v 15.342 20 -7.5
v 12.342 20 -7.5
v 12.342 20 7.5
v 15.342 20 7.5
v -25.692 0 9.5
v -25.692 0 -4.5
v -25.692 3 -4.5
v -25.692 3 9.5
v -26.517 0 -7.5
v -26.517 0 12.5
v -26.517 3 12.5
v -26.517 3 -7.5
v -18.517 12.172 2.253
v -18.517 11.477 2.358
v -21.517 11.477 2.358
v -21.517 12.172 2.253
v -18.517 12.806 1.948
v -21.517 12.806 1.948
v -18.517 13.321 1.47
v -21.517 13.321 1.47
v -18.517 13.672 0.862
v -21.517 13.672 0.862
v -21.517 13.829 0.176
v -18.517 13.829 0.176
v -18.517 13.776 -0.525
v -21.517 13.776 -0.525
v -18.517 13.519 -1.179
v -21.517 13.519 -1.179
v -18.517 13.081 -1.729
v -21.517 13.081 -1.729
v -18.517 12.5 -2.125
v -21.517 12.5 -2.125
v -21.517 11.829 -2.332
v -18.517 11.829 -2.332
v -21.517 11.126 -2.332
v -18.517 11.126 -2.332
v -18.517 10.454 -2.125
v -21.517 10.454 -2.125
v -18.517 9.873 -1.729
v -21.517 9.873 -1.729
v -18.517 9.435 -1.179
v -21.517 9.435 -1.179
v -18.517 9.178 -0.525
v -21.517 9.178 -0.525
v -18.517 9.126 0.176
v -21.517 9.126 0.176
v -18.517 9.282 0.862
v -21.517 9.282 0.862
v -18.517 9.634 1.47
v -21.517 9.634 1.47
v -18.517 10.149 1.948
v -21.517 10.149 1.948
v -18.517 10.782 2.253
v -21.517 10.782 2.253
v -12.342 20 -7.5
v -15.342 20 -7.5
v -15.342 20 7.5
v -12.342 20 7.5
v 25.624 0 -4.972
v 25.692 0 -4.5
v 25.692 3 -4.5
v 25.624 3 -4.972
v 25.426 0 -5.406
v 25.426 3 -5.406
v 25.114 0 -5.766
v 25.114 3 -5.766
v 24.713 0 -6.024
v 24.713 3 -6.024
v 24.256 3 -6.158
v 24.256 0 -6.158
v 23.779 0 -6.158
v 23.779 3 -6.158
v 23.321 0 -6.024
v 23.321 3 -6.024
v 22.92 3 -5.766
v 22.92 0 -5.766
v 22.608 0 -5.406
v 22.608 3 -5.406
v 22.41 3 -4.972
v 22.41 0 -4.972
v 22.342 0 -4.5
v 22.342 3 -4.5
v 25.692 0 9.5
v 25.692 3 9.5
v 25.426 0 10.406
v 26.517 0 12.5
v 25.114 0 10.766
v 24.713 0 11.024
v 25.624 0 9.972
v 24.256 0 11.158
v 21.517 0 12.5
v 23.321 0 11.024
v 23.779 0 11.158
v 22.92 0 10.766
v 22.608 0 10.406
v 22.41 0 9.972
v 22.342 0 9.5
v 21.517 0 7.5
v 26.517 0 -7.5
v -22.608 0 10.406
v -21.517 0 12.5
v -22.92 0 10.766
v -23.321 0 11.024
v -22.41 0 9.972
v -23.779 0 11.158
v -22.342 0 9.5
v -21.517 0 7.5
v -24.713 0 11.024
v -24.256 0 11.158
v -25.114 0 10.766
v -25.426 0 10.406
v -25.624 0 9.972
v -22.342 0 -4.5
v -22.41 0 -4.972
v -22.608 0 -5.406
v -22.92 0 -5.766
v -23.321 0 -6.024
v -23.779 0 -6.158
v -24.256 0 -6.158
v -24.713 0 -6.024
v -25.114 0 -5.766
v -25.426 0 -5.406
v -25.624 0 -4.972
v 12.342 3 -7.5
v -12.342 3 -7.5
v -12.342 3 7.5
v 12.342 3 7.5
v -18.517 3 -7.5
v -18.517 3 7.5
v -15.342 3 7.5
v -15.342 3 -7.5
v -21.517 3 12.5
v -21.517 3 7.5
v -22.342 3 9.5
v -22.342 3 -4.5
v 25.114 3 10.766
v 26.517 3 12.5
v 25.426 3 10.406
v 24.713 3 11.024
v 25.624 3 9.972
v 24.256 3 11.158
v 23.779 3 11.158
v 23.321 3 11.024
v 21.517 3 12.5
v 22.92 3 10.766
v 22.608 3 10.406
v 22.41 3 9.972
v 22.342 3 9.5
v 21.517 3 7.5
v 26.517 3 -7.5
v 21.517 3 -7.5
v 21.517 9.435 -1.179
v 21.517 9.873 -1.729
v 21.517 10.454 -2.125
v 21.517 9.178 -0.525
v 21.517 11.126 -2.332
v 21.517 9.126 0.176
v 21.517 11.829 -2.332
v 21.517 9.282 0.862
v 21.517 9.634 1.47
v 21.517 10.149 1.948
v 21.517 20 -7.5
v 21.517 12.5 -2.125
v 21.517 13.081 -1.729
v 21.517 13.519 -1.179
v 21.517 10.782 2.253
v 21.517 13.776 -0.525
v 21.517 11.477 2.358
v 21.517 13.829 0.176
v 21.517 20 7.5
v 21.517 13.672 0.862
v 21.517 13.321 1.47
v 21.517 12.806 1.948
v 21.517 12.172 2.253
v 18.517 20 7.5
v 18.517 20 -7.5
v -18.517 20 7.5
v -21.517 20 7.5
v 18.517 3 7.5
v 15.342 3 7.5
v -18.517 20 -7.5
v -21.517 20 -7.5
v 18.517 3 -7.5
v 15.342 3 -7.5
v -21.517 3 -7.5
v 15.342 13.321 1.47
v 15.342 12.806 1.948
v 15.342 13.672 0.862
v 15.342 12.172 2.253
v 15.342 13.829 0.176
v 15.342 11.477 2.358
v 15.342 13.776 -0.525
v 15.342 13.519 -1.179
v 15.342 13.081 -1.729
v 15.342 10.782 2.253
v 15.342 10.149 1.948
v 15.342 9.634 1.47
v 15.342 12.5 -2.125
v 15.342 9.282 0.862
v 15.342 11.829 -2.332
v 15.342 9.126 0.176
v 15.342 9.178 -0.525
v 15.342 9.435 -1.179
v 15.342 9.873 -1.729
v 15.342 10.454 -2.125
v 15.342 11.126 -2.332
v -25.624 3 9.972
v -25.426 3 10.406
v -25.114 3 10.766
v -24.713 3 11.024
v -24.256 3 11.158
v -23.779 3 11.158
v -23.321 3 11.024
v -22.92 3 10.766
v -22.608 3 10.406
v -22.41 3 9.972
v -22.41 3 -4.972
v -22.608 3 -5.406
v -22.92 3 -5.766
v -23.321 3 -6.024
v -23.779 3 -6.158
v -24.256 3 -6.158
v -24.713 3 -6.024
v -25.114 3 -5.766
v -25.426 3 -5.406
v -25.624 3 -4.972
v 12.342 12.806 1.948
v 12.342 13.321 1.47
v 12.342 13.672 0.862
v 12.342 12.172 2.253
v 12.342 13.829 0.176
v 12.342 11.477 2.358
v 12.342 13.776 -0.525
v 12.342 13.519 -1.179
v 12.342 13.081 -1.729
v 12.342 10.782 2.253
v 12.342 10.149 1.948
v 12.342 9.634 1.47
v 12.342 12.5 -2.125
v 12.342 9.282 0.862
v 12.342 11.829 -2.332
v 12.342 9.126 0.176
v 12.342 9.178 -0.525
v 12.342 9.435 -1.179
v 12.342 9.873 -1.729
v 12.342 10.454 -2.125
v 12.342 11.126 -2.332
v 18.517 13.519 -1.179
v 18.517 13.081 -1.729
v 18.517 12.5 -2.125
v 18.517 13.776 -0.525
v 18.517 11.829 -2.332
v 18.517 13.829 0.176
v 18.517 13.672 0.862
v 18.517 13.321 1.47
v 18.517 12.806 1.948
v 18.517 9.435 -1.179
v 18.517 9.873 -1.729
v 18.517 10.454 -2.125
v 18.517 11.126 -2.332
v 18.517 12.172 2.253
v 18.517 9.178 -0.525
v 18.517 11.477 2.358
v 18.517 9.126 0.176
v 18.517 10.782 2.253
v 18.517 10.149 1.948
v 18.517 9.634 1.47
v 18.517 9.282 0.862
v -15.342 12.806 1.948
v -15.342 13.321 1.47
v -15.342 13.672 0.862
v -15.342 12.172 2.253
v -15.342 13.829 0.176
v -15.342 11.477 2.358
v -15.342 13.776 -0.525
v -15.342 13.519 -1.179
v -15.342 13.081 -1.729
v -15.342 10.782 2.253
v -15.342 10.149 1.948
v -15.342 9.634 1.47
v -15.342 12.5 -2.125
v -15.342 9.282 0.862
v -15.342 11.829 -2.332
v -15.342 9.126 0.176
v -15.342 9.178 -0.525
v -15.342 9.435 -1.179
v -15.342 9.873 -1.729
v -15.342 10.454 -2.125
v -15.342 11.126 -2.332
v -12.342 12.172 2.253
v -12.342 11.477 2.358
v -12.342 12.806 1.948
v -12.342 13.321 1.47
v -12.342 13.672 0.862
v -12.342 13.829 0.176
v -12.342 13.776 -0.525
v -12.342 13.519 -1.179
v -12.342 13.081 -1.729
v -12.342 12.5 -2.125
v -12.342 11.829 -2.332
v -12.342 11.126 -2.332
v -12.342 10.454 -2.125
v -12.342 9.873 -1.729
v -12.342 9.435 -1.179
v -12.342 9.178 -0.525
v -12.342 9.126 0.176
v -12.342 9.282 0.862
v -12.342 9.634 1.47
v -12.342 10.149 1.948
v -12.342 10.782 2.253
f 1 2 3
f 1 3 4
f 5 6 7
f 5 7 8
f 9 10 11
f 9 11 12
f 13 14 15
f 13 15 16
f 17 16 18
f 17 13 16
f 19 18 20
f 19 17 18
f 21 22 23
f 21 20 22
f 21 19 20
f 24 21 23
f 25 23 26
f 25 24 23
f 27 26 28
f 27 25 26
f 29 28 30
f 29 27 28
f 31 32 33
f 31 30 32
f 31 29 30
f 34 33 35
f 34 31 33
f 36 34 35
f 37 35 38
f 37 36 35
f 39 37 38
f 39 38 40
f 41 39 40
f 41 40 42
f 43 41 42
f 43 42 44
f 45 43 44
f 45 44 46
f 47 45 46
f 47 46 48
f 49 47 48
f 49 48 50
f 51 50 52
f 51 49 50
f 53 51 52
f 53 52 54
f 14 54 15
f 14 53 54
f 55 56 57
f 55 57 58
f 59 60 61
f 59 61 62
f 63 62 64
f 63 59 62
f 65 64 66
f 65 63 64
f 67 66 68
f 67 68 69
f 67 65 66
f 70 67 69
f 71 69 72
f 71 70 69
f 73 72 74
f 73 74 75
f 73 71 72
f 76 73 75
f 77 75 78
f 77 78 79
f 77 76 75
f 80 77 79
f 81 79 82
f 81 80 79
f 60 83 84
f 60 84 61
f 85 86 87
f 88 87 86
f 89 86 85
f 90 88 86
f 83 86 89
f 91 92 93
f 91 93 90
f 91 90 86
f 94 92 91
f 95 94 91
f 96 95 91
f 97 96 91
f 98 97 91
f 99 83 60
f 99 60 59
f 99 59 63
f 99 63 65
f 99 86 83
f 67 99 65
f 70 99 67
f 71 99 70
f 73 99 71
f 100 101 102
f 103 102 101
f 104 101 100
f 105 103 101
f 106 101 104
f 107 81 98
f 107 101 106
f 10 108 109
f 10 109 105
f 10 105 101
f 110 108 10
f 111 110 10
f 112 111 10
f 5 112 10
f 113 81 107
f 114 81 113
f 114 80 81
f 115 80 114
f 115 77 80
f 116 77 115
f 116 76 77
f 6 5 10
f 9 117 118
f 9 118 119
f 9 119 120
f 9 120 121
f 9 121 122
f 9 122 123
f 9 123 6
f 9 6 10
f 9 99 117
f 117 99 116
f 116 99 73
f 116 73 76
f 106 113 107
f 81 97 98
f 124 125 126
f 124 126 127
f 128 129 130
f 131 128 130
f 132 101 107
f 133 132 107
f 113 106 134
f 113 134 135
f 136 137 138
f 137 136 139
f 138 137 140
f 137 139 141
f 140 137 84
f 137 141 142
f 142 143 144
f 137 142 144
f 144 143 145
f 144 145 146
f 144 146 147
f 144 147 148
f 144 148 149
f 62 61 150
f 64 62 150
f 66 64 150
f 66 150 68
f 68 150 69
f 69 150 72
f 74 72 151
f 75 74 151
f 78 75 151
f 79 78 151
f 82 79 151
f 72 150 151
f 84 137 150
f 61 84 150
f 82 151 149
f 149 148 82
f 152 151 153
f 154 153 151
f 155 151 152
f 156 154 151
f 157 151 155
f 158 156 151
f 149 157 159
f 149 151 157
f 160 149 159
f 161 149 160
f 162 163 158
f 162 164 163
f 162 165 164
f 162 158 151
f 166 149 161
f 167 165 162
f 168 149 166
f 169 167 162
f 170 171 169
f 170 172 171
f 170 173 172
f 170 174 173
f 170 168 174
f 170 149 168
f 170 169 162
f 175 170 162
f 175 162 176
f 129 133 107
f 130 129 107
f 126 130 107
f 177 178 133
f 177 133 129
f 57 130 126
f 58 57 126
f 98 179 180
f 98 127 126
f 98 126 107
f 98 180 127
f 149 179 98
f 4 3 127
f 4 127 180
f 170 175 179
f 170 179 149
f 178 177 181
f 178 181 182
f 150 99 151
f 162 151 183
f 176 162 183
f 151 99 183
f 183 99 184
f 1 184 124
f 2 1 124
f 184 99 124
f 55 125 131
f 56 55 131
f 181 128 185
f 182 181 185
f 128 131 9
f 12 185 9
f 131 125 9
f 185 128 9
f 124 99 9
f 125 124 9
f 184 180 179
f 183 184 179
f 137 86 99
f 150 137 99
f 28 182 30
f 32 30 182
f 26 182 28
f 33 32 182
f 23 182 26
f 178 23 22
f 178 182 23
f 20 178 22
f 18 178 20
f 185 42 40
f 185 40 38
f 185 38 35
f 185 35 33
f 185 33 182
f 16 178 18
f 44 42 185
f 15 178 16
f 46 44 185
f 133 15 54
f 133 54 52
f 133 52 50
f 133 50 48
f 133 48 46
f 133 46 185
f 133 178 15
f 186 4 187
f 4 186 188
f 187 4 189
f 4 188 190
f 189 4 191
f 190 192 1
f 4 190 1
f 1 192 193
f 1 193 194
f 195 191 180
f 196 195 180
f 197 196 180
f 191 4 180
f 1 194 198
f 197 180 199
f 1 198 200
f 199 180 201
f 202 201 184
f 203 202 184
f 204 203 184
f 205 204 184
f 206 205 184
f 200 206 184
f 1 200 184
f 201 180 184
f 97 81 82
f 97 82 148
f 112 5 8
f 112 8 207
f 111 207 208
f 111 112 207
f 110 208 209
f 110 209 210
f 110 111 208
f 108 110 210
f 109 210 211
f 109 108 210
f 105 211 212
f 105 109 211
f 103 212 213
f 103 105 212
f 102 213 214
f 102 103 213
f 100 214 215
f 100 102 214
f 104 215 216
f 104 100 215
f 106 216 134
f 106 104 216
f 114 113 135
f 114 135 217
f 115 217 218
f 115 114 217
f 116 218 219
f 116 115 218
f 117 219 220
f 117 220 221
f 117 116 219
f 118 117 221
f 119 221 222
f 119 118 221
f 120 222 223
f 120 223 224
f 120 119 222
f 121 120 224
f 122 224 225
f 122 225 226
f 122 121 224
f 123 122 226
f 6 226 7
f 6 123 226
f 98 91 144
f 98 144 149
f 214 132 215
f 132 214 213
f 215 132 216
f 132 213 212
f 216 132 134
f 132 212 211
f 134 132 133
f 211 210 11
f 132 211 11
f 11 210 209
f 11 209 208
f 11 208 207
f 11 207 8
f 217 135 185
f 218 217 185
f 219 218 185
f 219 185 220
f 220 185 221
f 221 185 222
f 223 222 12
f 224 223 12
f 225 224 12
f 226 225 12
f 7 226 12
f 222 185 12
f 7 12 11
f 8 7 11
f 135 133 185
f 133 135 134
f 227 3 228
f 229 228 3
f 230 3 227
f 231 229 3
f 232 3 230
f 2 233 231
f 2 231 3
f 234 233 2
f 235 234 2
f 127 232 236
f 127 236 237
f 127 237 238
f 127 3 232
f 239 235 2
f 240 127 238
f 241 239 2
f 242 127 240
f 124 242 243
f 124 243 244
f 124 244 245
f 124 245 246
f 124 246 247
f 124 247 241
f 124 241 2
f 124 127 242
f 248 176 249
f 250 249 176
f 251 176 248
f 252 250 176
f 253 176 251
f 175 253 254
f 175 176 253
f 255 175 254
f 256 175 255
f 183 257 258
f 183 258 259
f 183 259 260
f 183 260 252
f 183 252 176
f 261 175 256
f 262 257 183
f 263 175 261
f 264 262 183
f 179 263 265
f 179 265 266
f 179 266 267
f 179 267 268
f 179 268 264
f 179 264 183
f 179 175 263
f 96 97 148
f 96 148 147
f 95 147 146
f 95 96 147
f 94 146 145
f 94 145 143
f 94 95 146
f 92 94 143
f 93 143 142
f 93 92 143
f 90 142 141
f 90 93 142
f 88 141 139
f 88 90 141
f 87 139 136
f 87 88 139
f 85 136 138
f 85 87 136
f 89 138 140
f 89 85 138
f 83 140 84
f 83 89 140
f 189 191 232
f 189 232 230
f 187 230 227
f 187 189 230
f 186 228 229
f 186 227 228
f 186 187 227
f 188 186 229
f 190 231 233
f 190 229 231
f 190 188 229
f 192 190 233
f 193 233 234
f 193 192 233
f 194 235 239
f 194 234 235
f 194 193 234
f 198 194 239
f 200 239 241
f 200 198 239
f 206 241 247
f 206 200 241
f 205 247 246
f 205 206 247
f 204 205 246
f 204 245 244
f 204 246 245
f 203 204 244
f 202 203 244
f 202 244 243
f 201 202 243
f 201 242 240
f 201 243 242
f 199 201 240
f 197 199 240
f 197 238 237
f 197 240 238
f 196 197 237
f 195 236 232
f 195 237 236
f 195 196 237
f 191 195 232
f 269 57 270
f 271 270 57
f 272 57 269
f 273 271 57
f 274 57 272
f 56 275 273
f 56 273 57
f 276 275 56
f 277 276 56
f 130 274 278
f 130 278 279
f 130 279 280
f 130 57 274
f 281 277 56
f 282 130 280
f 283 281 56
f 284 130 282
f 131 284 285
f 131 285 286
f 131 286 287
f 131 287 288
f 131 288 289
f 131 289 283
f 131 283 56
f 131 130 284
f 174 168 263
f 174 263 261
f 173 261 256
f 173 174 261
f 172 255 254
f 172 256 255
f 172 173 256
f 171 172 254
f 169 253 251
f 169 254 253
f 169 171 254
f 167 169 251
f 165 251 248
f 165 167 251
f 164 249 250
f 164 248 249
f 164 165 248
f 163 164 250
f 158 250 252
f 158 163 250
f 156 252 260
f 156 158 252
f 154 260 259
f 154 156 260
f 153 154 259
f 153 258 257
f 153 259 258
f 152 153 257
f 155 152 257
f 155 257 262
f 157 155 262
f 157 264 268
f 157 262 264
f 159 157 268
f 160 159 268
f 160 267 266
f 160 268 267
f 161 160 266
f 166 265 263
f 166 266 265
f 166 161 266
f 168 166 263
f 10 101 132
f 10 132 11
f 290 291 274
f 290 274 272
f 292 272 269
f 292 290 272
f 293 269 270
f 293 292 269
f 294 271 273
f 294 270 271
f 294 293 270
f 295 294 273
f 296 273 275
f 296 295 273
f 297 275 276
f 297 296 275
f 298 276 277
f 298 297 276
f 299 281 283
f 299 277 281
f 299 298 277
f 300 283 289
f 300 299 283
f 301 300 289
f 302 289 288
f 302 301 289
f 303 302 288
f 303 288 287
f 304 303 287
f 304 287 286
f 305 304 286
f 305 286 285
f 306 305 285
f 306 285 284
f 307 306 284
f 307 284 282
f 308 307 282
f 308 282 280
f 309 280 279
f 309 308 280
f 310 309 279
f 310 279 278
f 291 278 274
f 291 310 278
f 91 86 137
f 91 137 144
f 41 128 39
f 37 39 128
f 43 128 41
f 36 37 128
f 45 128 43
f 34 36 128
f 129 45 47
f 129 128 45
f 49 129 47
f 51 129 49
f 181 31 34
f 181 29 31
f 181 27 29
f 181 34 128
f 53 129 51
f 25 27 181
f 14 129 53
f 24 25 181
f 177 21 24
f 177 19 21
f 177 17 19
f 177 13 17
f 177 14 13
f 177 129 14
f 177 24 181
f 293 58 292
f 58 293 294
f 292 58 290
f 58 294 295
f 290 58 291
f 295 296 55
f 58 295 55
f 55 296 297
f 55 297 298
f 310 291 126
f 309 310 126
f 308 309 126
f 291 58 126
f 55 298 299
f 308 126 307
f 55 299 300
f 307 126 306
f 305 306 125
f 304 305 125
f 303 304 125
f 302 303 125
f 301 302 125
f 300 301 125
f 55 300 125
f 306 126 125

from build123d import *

# Parameters (mm, degrees)
SKETCH1_W               = 30.6846
SKETCH1_H               = 15
BOSS_EXTRUDE1_DEPTH     = 3
SKETCH2_W               = 3
SKETCH2_H               = 15
BOSS_EXTRUDE2_DEPTH     = 17
SKETCH4_W               = 3.175
SKETCH4_H               = 3
BOSS_EXTRUDE3_DEPTH     = 15
CUT_EXTRUDE1_DEPTH      = 43.601409744
CUT_EXTRUDE1_DEPTH_BACK = 43.601409744
SKETCH3_R               = 2.358188849
SKETCH5_W               = 5
SKETCH5_H               = 20
BOSS_EXTRUDE4_DEPTH     = 3


with BuildPart() as part:
    # Sketch1 → Boss-Extrude1 (new body)
    with BuildSketch(Plane(origin=(0, 0, 0), x_dir=(1, 0, 0), z_dir=(0, 1, 0))):
        Rectangle(SKETCH1_W, SKETCH1_H)
    extrude(amount=BOSS_EXTRUDE1_DEPTH)

    # Sketch2 → Boss-Extrude2 (add)
    with BuildSketch(Plane(origin=(0, 3, 0), x_dir=(1, 0, 0), z_dir=(0, 1, 0))):
        with Locations((-13.8423, 0)):
            Rectangle(SKETCH2_W, SKETCH2_H)
        with Locations((13.8423, 0)):
            Rectangle(SKETCH2_W, SKETCH2_H)
    extrude(amount=BOSS_EXTRUDE2_DEPTH)

    # Sketch4 → Boss-Extrude3 (add)
    with BuildSketch(Plane.XY.offset(7.5)):
        Polygon((-18.5173, 0), (-18.5173, 3), (-18.5173, 20), (-21.5173, 20), (-21.5173, 0), align=None)
        with Locations((-16.9298, 1.5)):
            Rectangle(SKETCH4_W, SKETCH4_H)
        with Locations((16.9298, 1.5)):
            Rectangle(SKETCH4_W, SKETCH4_H)
        Polygon((18.5173, 20), (18.5173, 3), (18.5173, 0), (21.5173, 0), (21.5173, 20), align=None)
    extrude(amount=-BOSS_EXTRUDE3_DEPTH)

    # Sketch3 → Cut-Extrude1 (cut, two sides: drawn at the far end of the back side and taken through both)
    with BuildSketch(Plane.ZY.offset(15.3423).offset(-CUT_EXTRUDE1_DEPTH_BACK)):
        with Locations((0, 11.477245264)):
            Circle(SKETCH3_R)
    extrude(amount=CUT_EXTRUDE1_DEPTH + CUT_EXTRUDE1_DEPTH_BACK, mode=Mode.SUBTRACT)

    # Sketch5 → Boss-Extrude4 (add)
    # profile 1 of 2: a face of its own
    with BuildSketch(Plane(origin=(0, 0, 0), x_dir=(-1, 0, 0), z_dir=(0, -1, 0))):
        with Locations((24.0173, -2.5)):
            Rectangle(SKETCH5_W, SKETCH5_H)
        with BuildLine():
            Line((25.6923, 4.5), (25.6923, -9.5))
            ThreePointArc((25.6923, -9.5), (24.0173, -11.175), (22.3423, -9.5))
            Line((22.3423, -9.5), (22.3423, 4.5))
            ThreePointArc((22.3423, 4.5), (24.0173, 6.175), (25.6923, 4.5))
        make_face(mode=Mode.SUBTRACT)
    # profile 2 of 2: a face of its own
    with BuildSketch(Plane(origin=(0, 0, 0), x_dir=(-1, 0, 0), z_dir=(0, -1, 0))):
        with Locations((-24.0173, -2.5)):
            Rectangle(SKETCH5_W, SKETCH5_H)
        with BuildLine():
            Line((-22.3423, 4.5), (-22.3423, -9.5))
            ThreePointArc((-22.3423, -9.5), (-24.0173, -11.175), (-25.6923, -9.5))
            Line((-25.6923, -9.5), (-25.6923, 4.5))
            ThreePointArc((-25.6923, 4.5), (-24.0173, 6.175), (-22.3423, 4.5))
        make_face(mode=Mode.SUBTRACT)
    extrude(amount=-BOSS_EXTRUDE4_DEPTH)


solid = part.part
